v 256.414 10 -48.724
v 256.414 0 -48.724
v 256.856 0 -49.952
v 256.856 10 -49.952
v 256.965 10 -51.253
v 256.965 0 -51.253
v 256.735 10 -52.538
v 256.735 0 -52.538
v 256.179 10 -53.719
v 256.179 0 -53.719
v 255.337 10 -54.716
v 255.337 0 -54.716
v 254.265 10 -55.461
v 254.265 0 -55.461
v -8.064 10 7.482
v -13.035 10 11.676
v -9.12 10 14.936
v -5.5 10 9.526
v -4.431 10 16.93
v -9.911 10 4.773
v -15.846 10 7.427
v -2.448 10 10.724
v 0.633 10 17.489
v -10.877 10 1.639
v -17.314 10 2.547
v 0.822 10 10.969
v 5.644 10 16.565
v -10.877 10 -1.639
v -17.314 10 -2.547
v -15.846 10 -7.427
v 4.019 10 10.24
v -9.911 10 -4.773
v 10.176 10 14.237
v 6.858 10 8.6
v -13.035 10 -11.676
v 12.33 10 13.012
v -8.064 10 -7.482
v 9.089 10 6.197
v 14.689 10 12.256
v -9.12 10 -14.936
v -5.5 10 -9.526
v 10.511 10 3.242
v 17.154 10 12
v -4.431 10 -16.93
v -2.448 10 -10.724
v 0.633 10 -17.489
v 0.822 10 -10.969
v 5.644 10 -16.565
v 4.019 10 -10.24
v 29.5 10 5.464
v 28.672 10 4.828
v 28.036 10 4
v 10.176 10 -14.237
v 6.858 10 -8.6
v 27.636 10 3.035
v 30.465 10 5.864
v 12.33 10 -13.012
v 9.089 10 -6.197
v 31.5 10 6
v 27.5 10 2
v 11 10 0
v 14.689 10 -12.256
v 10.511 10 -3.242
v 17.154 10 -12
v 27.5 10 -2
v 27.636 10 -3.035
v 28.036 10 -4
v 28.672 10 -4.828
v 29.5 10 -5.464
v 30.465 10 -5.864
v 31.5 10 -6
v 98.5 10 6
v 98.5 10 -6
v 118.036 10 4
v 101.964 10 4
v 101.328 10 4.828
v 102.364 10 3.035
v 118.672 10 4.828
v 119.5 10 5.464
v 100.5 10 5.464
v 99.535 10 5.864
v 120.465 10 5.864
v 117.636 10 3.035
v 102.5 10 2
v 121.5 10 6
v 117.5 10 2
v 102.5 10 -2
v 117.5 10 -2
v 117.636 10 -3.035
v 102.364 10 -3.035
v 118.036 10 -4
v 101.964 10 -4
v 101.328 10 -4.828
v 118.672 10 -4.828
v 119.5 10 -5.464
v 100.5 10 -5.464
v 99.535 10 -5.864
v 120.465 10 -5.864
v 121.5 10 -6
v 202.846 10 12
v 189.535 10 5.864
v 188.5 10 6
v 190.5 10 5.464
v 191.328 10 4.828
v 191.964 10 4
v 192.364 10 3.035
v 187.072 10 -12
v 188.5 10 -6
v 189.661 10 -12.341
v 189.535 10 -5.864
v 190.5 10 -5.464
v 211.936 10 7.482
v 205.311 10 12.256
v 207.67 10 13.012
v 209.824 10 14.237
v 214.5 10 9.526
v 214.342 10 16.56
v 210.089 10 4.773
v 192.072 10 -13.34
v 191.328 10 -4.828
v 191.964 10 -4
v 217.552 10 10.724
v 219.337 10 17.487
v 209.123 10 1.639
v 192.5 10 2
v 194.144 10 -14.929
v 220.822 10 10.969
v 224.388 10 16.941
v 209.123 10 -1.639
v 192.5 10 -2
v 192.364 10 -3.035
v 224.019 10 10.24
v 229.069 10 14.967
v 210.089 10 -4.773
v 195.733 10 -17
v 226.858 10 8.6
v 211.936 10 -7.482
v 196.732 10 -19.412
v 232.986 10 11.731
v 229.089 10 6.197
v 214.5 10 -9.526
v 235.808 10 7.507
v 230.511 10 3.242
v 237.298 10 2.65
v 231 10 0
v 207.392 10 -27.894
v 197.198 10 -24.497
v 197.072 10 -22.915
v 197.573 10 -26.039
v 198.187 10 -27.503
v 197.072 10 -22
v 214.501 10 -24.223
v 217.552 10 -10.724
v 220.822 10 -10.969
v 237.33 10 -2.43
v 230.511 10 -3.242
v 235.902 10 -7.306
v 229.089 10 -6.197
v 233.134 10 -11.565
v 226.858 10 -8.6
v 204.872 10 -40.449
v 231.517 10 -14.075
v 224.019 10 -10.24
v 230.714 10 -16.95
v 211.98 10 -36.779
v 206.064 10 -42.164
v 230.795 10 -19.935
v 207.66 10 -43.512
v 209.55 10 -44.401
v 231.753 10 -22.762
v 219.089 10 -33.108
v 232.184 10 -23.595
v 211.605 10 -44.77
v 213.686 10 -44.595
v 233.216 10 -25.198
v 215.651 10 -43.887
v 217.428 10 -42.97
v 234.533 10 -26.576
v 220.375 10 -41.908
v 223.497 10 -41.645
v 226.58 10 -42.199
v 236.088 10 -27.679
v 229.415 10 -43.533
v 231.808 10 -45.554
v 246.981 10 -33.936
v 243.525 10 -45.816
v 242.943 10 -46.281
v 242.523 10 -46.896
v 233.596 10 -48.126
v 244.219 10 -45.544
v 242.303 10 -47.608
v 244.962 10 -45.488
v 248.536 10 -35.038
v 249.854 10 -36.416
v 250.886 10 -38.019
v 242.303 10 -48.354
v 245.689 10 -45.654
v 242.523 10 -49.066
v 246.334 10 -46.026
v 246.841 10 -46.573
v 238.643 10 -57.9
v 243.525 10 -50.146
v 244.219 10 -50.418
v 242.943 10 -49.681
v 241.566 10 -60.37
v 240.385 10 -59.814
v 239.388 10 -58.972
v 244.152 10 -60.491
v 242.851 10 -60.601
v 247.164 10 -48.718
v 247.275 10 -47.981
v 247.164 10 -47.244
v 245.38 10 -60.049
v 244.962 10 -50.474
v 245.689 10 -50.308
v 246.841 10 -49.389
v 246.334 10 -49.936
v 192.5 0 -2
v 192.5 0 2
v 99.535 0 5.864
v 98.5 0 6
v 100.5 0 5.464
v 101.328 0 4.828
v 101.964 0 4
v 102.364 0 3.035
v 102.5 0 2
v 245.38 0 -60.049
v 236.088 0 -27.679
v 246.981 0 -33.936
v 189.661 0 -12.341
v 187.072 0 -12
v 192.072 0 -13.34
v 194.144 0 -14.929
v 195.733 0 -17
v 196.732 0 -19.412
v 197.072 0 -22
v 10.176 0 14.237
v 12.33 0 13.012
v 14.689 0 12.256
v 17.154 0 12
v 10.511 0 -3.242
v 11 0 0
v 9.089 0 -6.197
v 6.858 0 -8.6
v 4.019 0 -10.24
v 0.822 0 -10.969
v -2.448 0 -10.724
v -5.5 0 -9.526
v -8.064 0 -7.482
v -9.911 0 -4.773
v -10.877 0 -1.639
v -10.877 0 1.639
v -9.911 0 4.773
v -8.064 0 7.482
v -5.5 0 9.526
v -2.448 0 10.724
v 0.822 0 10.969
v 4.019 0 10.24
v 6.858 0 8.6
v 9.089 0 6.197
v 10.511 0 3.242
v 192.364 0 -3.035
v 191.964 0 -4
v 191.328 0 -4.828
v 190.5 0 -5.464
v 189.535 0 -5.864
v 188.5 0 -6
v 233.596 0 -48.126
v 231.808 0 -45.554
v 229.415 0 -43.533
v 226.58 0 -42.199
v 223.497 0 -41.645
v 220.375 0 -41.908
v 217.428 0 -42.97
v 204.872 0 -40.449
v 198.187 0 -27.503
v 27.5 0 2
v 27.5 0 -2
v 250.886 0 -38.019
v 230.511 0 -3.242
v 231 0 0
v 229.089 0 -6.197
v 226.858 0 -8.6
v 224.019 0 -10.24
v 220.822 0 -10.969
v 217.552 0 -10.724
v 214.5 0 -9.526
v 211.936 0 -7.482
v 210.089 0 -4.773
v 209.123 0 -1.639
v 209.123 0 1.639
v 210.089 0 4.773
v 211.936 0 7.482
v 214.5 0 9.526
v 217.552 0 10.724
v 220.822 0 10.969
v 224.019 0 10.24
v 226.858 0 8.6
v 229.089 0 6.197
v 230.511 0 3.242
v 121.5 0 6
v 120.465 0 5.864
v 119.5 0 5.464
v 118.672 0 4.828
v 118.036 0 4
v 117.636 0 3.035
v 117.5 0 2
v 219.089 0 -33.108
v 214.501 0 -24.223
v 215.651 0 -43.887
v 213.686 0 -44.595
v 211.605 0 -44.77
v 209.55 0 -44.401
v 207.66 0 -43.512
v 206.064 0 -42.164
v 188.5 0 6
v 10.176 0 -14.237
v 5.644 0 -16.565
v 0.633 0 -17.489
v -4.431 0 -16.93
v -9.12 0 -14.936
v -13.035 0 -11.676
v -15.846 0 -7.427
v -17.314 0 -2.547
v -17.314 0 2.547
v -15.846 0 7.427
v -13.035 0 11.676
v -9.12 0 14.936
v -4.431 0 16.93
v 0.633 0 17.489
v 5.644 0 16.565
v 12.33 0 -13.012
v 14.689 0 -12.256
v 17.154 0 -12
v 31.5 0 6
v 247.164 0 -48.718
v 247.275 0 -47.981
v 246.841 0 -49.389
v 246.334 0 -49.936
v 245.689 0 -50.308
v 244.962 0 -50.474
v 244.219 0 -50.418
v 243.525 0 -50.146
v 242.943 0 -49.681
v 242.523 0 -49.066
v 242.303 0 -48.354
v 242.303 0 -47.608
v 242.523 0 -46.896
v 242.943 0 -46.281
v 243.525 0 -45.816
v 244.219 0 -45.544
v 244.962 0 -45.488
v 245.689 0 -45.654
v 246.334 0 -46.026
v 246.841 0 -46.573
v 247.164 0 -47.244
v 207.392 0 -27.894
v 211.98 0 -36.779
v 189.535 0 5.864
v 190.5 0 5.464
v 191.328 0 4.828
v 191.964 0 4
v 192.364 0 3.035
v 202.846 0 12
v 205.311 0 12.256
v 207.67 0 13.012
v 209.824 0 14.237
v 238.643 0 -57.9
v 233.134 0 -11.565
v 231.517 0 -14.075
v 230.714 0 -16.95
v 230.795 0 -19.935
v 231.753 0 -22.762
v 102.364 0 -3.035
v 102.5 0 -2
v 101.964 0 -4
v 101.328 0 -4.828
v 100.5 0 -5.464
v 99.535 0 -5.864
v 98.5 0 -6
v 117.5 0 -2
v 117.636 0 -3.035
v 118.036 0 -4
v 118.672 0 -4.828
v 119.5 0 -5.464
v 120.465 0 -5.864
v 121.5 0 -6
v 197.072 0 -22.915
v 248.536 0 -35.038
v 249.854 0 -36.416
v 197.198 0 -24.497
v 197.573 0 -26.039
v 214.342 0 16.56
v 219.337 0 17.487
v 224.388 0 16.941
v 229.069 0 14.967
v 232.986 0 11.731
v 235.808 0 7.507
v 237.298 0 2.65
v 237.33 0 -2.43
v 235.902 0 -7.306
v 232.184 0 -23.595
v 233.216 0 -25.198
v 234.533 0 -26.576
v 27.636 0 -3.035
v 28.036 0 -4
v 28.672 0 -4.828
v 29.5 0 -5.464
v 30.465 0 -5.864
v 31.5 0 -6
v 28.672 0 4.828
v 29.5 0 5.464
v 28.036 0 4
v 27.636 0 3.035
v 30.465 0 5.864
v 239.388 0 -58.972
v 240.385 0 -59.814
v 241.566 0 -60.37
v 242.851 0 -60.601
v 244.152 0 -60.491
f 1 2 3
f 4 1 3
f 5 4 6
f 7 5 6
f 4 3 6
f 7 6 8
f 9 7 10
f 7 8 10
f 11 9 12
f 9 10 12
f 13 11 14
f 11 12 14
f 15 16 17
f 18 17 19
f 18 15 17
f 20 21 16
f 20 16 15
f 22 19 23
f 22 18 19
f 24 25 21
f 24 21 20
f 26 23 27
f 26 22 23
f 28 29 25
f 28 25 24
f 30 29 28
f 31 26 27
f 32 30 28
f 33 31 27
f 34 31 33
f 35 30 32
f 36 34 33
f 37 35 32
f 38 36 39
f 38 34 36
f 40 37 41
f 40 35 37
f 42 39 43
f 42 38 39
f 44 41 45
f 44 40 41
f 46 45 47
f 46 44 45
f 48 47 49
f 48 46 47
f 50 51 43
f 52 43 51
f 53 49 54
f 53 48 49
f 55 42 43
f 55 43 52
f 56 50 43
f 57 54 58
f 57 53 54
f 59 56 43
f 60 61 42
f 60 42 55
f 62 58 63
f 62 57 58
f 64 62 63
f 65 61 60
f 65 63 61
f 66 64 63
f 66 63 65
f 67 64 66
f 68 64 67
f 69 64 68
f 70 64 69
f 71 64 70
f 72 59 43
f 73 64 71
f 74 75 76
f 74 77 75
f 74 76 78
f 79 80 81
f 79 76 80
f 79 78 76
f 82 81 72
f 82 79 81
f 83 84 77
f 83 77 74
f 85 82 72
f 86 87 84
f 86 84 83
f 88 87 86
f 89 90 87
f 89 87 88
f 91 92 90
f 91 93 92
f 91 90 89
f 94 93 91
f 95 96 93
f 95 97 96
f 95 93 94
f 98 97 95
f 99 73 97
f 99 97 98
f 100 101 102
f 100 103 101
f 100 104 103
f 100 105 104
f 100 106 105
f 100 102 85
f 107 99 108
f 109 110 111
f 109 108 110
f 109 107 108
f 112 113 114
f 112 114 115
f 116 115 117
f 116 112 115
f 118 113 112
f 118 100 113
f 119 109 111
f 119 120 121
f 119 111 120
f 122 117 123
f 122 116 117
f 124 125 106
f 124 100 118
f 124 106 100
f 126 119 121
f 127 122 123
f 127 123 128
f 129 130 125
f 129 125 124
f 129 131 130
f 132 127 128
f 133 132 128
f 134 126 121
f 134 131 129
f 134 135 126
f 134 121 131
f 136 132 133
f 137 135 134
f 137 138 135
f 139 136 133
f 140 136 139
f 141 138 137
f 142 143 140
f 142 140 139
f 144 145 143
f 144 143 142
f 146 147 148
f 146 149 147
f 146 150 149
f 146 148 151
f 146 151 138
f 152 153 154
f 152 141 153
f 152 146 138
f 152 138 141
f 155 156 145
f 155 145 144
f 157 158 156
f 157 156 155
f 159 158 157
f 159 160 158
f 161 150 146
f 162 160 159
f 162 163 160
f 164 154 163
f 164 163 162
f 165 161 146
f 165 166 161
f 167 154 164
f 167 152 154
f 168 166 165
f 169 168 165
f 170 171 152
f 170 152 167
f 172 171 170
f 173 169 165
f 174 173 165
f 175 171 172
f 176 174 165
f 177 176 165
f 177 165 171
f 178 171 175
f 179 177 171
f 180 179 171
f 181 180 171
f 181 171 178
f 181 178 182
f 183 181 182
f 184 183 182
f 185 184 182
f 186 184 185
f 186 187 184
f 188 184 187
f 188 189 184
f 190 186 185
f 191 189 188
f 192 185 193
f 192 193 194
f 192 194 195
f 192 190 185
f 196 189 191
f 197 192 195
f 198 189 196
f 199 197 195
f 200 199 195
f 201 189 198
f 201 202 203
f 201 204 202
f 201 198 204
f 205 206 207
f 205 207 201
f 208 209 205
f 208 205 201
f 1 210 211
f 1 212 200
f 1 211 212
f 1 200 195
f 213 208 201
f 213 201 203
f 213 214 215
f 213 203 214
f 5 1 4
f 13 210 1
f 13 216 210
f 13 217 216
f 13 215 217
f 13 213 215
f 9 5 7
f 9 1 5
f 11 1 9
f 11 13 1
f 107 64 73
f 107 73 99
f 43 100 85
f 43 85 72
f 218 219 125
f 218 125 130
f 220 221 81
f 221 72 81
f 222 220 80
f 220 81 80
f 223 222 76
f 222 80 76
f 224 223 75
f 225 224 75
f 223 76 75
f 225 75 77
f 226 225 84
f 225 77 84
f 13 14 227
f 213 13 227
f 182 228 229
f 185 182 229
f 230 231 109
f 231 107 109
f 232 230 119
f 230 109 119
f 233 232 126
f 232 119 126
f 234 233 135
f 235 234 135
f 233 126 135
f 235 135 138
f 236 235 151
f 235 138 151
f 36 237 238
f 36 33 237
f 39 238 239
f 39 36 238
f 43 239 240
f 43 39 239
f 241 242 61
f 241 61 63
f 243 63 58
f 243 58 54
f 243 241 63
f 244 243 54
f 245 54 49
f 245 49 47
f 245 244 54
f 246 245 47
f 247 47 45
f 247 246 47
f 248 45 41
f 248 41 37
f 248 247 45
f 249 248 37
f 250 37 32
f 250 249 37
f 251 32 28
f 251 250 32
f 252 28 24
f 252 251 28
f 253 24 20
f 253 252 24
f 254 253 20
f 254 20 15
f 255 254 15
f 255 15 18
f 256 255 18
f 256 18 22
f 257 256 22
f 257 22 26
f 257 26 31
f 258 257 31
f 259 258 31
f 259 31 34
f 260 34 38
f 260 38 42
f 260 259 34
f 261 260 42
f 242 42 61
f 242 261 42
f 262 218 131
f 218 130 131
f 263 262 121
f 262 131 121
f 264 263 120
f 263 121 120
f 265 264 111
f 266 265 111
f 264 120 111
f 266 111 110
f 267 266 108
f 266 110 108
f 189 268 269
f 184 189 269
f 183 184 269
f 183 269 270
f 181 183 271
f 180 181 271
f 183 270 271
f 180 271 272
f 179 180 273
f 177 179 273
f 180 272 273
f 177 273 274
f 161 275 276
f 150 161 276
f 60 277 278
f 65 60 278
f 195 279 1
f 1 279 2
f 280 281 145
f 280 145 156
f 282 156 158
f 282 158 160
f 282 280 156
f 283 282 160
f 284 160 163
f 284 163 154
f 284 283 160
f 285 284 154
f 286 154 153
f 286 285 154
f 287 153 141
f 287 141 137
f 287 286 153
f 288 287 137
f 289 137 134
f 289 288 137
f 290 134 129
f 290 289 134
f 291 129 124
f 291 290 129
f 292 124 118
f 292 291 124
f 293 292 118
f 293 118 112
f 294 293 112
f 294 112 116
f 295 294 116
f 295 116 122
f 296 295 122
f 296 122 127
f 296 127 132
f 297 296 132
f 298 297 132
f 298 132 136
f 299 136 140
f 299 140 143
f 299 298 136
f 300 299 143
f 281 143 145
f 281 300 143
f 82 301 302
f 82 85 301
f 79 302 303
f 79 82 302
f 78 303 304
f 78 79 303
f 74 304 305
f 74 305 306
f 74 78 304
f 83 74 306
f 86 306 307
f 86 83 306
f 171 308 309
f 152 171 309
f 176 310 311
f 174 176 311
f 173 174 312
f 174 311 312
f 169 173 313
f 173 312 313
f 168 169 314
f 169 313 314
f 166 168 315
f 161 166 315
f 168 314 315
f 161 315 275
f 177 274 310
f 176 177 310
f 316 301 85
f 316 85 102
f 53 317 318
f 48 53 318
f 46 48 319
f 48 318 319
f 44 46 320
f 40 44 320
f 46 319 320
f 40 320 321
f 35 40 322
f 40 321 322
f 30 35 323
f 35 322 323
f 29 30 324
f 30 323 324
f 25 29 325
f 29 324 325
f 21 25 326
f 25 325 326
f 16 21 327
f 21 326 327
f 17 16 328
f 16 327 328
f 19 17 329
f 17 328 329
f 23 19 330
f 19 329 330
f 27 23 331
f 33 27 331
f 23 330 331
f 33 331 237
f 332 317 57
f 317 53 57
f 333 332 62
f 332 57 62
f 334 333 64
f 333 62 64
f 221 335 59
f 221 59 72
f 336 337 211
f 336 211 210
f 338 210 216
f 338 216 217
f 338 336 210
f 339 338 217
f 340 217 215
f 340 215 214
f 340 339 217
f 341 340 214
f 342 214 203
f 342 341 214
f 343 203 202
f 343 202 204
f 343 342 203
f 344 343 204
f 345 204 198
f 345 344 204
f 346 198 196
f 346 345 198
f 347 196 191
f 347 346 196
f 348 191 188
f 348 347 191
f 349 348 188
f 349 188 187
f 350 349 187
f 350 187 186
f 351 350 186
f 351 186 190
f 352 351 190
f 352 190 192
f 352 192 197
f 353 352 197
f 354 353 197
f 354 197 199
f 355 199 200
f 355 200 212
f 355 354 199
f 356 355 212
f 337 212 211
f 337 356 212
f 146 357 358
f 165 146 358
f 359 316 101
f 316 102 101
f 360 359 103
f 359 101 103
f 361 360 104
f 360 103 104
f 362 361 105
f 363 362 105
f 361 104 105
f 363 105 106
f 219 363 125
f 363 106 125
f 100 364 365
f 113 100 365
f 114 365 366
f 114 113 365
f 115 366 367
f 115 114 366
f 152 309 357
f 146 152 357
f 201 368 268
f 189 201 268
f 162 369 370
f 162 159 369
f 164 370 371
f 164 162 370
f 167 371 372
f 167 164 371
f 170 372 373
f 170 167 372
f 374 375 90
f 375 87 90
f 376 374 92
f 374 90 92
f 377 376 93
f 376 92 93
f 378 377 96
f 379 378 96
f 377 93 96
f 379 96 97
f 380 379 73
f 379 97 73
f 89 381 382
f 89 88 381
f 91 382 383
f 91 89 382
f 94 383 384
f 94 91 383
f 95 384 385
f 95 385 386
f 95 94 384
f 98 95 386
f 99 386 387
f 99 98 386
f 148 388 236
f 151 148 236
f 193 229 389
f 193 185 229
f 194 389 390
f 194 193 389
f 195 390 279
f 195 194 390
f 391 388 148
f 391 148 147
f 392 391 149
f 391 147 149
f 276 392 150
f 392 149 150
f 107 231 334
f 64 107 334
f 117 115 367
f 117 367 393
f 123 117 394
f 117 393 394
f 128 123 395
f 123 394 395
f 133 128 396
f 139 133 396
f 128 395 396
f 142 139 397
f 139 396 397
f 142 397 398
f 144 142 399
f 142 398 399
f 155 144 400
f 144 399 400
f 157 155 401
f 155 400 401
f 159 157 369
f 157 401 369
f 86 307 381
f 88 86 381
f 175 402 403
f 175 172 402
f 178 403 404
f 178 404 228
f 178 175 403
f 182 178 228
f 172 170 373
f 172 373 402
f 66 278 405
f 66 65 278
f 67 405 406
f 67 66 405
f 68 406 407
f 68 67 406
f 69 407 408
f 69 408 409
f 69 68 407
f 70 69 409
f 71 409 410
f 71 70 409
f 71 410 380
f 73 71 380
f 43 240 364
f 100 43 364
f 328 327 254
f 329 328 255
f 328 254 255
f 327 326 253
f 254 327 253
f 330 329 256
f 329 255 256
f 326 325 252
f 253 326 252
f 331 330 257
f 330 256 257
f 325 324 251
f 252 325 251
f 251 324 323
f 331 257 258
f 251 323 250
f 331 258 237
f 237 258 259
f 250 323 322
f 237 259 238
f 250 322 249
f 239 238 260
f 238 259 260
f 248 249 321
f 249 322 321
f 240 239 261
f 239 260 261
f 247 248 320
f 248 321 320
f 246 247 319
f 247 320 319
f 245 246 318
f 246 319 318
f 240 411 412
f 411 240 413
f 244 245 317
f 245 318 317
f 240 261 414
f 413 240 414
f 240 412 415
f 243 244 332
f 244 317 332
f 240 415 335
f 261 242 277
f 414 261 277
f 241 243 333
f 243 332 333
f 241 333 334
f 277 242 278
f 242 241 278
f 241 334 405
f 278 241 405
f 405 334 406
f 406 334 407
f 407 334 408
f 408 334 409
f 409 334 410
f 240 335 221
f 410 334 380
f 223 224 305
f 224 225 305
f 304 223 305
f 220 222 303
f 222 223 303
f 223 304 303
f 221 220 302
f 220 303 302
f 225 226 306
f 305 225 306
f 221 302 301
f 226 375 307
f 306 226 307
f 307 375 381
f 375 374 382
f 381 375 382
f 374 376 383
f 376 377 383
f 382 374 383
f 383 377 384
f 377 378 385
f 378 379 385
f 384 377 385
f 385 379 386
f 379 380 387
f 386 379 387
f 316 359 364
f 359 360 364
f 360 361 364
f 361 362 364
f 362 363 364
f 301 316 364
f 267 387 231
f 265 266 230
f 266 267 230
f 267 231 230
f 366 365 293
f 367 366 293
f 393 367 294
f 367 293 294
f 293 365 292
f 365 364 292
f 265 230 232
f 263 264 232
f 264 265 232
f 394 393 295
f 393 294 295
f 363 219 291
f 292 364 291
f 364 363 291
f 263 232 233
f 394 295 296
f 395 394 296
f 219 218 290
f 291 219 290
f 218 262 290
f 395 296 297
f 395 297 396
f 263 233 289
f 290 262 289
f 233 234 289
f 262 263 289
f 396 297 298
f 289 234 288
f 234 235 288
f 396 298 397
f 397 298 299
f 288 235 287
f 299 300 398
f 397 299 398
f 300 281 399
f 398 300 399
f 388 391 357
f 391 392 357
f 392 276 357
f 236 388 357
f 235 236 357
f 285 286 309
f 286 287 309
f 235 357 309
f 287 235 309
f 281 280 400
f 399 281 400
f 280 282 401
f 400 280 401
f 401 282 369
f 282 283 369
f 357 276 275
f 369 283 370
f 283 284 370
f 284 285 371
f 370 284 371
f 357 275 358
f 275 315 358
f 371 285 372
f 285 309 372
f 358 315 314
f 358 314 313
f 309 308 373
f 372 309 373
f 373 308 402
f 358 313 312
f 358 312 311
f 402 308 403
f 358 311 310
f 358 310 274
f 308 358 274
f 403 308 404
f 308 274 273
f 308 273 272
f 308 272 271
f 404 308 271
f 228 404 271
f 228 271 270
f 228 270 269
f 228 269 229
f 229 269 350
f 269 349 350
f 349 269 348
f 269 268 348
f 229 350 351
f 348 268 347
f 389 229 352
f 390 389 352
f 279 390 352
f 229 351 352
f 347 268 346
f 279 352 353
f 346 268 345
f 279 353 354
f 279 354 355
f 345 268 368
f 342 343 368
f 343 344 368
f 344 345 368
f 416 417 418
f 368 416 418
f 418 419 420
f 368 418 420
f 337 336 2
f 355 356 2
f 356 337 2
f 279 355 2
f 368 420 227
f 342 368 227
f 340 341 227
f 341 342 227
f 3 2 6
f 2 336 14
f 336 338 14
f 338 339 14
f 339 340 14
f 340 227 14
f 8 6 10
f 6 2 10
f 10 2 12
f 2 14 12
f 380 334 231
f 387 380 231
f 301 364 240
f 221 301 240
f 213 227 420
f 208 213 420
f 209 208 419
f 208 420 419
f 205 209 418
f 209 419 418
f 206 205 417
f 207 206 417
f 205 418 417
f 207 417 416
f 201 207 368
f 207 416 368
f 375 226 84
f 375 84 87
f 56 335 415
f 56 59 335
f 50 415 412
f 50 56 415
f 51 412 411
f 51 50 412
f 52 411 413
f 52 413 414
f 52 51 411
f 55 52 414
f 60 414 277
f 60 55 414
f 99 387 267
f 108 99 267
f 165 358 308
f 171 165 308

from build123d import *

# Parameters (mm, degrees)
SKETCH1_W           = 75
SKETCH1_H           = 12
SKETCH1_R           = 11
SKETCH1_R_2         = 2.5
BOSS_EXTRUDE1_DEPTH = 10
FILLET1_R           = 4
FILLET2_R           = 12
FILLET3_R           = 10


with BuildPart() as part:
    # Sketch1 → Boss-Extrude1 (new body)
    with BuildSketch(Plane(origin=(0, 0, 0), x_dir=(1, 0, 0), z_dir=(0, 1, 0))):
        with BuildLine():
            ThreePointArc((12.737739203, 12), (-17.5, 0), (12.737739203, -12))
            Line((12.737739203, -12), (207.262260797, -12))
            ThreePointArc((207.262260797, -12), (233.974449241, -10.533981603), (228.029081208, 15.549400469))
            Line((228.029081208, 15.549400469), (233.534736894, 26.211846505))
            Line((233.534736894, 26.211846505), (249.534736894, 35.402238979))
            Line((249.534736894, 35.402238979), (256.413650124, 48.724183776))
            ThreePointArc((256.413650124, 48.724183776), (256.734536929, 52.537540906), (254.264987478, 55.460892826))
            Line((254.264987478, 55.460892826), (245.379615782, 60.048939231))
            ThreePointArc((245.379615782, 60.048939231), (241.566258652, 60.369826035), (238.642906731, 57.900276585))
            Line((238.642906731, 57.900276585), (233.596055686, 48.126367719))
            ThreePointArc((233.596055686, 48.126367719), (226.580011076, 42.199449038), (217.427953964, 42.969577368))
            Line((217.427953964, 42.969577368), (215.650879625, 43.887186649))
            ThreePointArc((215.650879625, 43.887186649), (209.549508217, 44.400605536), (204.872145144, 40.449326415))
            Line((204.872145144, 40.449326415), (197.072466256, 25.344194531))
            Line((197.072466256, 25.344194531), (197.072466256, 12))
            Line((197.072466256, 12), (12.737739203, 12))
        make_face()
        with Locations((65, 0)):
            Rectangle(SKETCH1_W, SKETCH1_H, mode=Mode.SUBTRACT)
        with Locations((155, 0)):
            Rectangle(SKETCH1_W, SKETCH1_H, mode=Mode.SUBTRACT)
        Circle(SKETCH1_R, mode=Mode.SUBTRACT)
        with Locations((244.775450585, 47.981007162)):
            Circle(SKETCH1_R_2, mode=Mode.SUBTRACT)
        Polygon((207.392396097, 27.893517595), (211.980442501, 36.778889292), (219.088739859, 33.108452168), (214.500693454, 24.223080471), align=None, mode=Mode.SUBTRACT)
        with Locations((220, 0)):
            Circle(SKETCH1_R, mode=Mode.SUBTRACT)
    extrude(amount=BOSS_EXTRUDE1_DEPTH)

    # Fillet1
    fillet1_edges = [part.edges().sort_by_distance(p)[0] for p in [
        (27.5, 5, -6),
        (27.5, 5, 6),
        (102.5, 5, 6),
        (102.5, 5, -6),
        (117.5, 5, -6),
        (117.5, 5, 6),
        (192.5, 5, 6),
        (192.5, 5, -6),
    ]]
    fillet(fillet1_edges, radius=FILLET1_R)

    # Fillet2
    fillet2_edges = [part.edges().sort_by_distance(p)[0] for p in [
        (12.737739203, 5, 12),
        (12.737739203, 5, -12),
        (207.262260797, 5, 12),
    ]]
    fillet(fillet2_edges, radius=FILLET2_R)

    # Fillet3
    fillet3_edges = [part.edges().sort_by_distance(p)[0] for p in [
        (197.072466256, 5, -12),
        (197.072466256, 5, -25.344194531),
        (249.534736894, 5, -35.402238979),
        (233.534736894, 5, -26.211846505),
        (228.029081208, 5, -15.549400469),
    ]]
    fillet(fillet3_edges, radius=FILLET3_R)


solid = part.part
